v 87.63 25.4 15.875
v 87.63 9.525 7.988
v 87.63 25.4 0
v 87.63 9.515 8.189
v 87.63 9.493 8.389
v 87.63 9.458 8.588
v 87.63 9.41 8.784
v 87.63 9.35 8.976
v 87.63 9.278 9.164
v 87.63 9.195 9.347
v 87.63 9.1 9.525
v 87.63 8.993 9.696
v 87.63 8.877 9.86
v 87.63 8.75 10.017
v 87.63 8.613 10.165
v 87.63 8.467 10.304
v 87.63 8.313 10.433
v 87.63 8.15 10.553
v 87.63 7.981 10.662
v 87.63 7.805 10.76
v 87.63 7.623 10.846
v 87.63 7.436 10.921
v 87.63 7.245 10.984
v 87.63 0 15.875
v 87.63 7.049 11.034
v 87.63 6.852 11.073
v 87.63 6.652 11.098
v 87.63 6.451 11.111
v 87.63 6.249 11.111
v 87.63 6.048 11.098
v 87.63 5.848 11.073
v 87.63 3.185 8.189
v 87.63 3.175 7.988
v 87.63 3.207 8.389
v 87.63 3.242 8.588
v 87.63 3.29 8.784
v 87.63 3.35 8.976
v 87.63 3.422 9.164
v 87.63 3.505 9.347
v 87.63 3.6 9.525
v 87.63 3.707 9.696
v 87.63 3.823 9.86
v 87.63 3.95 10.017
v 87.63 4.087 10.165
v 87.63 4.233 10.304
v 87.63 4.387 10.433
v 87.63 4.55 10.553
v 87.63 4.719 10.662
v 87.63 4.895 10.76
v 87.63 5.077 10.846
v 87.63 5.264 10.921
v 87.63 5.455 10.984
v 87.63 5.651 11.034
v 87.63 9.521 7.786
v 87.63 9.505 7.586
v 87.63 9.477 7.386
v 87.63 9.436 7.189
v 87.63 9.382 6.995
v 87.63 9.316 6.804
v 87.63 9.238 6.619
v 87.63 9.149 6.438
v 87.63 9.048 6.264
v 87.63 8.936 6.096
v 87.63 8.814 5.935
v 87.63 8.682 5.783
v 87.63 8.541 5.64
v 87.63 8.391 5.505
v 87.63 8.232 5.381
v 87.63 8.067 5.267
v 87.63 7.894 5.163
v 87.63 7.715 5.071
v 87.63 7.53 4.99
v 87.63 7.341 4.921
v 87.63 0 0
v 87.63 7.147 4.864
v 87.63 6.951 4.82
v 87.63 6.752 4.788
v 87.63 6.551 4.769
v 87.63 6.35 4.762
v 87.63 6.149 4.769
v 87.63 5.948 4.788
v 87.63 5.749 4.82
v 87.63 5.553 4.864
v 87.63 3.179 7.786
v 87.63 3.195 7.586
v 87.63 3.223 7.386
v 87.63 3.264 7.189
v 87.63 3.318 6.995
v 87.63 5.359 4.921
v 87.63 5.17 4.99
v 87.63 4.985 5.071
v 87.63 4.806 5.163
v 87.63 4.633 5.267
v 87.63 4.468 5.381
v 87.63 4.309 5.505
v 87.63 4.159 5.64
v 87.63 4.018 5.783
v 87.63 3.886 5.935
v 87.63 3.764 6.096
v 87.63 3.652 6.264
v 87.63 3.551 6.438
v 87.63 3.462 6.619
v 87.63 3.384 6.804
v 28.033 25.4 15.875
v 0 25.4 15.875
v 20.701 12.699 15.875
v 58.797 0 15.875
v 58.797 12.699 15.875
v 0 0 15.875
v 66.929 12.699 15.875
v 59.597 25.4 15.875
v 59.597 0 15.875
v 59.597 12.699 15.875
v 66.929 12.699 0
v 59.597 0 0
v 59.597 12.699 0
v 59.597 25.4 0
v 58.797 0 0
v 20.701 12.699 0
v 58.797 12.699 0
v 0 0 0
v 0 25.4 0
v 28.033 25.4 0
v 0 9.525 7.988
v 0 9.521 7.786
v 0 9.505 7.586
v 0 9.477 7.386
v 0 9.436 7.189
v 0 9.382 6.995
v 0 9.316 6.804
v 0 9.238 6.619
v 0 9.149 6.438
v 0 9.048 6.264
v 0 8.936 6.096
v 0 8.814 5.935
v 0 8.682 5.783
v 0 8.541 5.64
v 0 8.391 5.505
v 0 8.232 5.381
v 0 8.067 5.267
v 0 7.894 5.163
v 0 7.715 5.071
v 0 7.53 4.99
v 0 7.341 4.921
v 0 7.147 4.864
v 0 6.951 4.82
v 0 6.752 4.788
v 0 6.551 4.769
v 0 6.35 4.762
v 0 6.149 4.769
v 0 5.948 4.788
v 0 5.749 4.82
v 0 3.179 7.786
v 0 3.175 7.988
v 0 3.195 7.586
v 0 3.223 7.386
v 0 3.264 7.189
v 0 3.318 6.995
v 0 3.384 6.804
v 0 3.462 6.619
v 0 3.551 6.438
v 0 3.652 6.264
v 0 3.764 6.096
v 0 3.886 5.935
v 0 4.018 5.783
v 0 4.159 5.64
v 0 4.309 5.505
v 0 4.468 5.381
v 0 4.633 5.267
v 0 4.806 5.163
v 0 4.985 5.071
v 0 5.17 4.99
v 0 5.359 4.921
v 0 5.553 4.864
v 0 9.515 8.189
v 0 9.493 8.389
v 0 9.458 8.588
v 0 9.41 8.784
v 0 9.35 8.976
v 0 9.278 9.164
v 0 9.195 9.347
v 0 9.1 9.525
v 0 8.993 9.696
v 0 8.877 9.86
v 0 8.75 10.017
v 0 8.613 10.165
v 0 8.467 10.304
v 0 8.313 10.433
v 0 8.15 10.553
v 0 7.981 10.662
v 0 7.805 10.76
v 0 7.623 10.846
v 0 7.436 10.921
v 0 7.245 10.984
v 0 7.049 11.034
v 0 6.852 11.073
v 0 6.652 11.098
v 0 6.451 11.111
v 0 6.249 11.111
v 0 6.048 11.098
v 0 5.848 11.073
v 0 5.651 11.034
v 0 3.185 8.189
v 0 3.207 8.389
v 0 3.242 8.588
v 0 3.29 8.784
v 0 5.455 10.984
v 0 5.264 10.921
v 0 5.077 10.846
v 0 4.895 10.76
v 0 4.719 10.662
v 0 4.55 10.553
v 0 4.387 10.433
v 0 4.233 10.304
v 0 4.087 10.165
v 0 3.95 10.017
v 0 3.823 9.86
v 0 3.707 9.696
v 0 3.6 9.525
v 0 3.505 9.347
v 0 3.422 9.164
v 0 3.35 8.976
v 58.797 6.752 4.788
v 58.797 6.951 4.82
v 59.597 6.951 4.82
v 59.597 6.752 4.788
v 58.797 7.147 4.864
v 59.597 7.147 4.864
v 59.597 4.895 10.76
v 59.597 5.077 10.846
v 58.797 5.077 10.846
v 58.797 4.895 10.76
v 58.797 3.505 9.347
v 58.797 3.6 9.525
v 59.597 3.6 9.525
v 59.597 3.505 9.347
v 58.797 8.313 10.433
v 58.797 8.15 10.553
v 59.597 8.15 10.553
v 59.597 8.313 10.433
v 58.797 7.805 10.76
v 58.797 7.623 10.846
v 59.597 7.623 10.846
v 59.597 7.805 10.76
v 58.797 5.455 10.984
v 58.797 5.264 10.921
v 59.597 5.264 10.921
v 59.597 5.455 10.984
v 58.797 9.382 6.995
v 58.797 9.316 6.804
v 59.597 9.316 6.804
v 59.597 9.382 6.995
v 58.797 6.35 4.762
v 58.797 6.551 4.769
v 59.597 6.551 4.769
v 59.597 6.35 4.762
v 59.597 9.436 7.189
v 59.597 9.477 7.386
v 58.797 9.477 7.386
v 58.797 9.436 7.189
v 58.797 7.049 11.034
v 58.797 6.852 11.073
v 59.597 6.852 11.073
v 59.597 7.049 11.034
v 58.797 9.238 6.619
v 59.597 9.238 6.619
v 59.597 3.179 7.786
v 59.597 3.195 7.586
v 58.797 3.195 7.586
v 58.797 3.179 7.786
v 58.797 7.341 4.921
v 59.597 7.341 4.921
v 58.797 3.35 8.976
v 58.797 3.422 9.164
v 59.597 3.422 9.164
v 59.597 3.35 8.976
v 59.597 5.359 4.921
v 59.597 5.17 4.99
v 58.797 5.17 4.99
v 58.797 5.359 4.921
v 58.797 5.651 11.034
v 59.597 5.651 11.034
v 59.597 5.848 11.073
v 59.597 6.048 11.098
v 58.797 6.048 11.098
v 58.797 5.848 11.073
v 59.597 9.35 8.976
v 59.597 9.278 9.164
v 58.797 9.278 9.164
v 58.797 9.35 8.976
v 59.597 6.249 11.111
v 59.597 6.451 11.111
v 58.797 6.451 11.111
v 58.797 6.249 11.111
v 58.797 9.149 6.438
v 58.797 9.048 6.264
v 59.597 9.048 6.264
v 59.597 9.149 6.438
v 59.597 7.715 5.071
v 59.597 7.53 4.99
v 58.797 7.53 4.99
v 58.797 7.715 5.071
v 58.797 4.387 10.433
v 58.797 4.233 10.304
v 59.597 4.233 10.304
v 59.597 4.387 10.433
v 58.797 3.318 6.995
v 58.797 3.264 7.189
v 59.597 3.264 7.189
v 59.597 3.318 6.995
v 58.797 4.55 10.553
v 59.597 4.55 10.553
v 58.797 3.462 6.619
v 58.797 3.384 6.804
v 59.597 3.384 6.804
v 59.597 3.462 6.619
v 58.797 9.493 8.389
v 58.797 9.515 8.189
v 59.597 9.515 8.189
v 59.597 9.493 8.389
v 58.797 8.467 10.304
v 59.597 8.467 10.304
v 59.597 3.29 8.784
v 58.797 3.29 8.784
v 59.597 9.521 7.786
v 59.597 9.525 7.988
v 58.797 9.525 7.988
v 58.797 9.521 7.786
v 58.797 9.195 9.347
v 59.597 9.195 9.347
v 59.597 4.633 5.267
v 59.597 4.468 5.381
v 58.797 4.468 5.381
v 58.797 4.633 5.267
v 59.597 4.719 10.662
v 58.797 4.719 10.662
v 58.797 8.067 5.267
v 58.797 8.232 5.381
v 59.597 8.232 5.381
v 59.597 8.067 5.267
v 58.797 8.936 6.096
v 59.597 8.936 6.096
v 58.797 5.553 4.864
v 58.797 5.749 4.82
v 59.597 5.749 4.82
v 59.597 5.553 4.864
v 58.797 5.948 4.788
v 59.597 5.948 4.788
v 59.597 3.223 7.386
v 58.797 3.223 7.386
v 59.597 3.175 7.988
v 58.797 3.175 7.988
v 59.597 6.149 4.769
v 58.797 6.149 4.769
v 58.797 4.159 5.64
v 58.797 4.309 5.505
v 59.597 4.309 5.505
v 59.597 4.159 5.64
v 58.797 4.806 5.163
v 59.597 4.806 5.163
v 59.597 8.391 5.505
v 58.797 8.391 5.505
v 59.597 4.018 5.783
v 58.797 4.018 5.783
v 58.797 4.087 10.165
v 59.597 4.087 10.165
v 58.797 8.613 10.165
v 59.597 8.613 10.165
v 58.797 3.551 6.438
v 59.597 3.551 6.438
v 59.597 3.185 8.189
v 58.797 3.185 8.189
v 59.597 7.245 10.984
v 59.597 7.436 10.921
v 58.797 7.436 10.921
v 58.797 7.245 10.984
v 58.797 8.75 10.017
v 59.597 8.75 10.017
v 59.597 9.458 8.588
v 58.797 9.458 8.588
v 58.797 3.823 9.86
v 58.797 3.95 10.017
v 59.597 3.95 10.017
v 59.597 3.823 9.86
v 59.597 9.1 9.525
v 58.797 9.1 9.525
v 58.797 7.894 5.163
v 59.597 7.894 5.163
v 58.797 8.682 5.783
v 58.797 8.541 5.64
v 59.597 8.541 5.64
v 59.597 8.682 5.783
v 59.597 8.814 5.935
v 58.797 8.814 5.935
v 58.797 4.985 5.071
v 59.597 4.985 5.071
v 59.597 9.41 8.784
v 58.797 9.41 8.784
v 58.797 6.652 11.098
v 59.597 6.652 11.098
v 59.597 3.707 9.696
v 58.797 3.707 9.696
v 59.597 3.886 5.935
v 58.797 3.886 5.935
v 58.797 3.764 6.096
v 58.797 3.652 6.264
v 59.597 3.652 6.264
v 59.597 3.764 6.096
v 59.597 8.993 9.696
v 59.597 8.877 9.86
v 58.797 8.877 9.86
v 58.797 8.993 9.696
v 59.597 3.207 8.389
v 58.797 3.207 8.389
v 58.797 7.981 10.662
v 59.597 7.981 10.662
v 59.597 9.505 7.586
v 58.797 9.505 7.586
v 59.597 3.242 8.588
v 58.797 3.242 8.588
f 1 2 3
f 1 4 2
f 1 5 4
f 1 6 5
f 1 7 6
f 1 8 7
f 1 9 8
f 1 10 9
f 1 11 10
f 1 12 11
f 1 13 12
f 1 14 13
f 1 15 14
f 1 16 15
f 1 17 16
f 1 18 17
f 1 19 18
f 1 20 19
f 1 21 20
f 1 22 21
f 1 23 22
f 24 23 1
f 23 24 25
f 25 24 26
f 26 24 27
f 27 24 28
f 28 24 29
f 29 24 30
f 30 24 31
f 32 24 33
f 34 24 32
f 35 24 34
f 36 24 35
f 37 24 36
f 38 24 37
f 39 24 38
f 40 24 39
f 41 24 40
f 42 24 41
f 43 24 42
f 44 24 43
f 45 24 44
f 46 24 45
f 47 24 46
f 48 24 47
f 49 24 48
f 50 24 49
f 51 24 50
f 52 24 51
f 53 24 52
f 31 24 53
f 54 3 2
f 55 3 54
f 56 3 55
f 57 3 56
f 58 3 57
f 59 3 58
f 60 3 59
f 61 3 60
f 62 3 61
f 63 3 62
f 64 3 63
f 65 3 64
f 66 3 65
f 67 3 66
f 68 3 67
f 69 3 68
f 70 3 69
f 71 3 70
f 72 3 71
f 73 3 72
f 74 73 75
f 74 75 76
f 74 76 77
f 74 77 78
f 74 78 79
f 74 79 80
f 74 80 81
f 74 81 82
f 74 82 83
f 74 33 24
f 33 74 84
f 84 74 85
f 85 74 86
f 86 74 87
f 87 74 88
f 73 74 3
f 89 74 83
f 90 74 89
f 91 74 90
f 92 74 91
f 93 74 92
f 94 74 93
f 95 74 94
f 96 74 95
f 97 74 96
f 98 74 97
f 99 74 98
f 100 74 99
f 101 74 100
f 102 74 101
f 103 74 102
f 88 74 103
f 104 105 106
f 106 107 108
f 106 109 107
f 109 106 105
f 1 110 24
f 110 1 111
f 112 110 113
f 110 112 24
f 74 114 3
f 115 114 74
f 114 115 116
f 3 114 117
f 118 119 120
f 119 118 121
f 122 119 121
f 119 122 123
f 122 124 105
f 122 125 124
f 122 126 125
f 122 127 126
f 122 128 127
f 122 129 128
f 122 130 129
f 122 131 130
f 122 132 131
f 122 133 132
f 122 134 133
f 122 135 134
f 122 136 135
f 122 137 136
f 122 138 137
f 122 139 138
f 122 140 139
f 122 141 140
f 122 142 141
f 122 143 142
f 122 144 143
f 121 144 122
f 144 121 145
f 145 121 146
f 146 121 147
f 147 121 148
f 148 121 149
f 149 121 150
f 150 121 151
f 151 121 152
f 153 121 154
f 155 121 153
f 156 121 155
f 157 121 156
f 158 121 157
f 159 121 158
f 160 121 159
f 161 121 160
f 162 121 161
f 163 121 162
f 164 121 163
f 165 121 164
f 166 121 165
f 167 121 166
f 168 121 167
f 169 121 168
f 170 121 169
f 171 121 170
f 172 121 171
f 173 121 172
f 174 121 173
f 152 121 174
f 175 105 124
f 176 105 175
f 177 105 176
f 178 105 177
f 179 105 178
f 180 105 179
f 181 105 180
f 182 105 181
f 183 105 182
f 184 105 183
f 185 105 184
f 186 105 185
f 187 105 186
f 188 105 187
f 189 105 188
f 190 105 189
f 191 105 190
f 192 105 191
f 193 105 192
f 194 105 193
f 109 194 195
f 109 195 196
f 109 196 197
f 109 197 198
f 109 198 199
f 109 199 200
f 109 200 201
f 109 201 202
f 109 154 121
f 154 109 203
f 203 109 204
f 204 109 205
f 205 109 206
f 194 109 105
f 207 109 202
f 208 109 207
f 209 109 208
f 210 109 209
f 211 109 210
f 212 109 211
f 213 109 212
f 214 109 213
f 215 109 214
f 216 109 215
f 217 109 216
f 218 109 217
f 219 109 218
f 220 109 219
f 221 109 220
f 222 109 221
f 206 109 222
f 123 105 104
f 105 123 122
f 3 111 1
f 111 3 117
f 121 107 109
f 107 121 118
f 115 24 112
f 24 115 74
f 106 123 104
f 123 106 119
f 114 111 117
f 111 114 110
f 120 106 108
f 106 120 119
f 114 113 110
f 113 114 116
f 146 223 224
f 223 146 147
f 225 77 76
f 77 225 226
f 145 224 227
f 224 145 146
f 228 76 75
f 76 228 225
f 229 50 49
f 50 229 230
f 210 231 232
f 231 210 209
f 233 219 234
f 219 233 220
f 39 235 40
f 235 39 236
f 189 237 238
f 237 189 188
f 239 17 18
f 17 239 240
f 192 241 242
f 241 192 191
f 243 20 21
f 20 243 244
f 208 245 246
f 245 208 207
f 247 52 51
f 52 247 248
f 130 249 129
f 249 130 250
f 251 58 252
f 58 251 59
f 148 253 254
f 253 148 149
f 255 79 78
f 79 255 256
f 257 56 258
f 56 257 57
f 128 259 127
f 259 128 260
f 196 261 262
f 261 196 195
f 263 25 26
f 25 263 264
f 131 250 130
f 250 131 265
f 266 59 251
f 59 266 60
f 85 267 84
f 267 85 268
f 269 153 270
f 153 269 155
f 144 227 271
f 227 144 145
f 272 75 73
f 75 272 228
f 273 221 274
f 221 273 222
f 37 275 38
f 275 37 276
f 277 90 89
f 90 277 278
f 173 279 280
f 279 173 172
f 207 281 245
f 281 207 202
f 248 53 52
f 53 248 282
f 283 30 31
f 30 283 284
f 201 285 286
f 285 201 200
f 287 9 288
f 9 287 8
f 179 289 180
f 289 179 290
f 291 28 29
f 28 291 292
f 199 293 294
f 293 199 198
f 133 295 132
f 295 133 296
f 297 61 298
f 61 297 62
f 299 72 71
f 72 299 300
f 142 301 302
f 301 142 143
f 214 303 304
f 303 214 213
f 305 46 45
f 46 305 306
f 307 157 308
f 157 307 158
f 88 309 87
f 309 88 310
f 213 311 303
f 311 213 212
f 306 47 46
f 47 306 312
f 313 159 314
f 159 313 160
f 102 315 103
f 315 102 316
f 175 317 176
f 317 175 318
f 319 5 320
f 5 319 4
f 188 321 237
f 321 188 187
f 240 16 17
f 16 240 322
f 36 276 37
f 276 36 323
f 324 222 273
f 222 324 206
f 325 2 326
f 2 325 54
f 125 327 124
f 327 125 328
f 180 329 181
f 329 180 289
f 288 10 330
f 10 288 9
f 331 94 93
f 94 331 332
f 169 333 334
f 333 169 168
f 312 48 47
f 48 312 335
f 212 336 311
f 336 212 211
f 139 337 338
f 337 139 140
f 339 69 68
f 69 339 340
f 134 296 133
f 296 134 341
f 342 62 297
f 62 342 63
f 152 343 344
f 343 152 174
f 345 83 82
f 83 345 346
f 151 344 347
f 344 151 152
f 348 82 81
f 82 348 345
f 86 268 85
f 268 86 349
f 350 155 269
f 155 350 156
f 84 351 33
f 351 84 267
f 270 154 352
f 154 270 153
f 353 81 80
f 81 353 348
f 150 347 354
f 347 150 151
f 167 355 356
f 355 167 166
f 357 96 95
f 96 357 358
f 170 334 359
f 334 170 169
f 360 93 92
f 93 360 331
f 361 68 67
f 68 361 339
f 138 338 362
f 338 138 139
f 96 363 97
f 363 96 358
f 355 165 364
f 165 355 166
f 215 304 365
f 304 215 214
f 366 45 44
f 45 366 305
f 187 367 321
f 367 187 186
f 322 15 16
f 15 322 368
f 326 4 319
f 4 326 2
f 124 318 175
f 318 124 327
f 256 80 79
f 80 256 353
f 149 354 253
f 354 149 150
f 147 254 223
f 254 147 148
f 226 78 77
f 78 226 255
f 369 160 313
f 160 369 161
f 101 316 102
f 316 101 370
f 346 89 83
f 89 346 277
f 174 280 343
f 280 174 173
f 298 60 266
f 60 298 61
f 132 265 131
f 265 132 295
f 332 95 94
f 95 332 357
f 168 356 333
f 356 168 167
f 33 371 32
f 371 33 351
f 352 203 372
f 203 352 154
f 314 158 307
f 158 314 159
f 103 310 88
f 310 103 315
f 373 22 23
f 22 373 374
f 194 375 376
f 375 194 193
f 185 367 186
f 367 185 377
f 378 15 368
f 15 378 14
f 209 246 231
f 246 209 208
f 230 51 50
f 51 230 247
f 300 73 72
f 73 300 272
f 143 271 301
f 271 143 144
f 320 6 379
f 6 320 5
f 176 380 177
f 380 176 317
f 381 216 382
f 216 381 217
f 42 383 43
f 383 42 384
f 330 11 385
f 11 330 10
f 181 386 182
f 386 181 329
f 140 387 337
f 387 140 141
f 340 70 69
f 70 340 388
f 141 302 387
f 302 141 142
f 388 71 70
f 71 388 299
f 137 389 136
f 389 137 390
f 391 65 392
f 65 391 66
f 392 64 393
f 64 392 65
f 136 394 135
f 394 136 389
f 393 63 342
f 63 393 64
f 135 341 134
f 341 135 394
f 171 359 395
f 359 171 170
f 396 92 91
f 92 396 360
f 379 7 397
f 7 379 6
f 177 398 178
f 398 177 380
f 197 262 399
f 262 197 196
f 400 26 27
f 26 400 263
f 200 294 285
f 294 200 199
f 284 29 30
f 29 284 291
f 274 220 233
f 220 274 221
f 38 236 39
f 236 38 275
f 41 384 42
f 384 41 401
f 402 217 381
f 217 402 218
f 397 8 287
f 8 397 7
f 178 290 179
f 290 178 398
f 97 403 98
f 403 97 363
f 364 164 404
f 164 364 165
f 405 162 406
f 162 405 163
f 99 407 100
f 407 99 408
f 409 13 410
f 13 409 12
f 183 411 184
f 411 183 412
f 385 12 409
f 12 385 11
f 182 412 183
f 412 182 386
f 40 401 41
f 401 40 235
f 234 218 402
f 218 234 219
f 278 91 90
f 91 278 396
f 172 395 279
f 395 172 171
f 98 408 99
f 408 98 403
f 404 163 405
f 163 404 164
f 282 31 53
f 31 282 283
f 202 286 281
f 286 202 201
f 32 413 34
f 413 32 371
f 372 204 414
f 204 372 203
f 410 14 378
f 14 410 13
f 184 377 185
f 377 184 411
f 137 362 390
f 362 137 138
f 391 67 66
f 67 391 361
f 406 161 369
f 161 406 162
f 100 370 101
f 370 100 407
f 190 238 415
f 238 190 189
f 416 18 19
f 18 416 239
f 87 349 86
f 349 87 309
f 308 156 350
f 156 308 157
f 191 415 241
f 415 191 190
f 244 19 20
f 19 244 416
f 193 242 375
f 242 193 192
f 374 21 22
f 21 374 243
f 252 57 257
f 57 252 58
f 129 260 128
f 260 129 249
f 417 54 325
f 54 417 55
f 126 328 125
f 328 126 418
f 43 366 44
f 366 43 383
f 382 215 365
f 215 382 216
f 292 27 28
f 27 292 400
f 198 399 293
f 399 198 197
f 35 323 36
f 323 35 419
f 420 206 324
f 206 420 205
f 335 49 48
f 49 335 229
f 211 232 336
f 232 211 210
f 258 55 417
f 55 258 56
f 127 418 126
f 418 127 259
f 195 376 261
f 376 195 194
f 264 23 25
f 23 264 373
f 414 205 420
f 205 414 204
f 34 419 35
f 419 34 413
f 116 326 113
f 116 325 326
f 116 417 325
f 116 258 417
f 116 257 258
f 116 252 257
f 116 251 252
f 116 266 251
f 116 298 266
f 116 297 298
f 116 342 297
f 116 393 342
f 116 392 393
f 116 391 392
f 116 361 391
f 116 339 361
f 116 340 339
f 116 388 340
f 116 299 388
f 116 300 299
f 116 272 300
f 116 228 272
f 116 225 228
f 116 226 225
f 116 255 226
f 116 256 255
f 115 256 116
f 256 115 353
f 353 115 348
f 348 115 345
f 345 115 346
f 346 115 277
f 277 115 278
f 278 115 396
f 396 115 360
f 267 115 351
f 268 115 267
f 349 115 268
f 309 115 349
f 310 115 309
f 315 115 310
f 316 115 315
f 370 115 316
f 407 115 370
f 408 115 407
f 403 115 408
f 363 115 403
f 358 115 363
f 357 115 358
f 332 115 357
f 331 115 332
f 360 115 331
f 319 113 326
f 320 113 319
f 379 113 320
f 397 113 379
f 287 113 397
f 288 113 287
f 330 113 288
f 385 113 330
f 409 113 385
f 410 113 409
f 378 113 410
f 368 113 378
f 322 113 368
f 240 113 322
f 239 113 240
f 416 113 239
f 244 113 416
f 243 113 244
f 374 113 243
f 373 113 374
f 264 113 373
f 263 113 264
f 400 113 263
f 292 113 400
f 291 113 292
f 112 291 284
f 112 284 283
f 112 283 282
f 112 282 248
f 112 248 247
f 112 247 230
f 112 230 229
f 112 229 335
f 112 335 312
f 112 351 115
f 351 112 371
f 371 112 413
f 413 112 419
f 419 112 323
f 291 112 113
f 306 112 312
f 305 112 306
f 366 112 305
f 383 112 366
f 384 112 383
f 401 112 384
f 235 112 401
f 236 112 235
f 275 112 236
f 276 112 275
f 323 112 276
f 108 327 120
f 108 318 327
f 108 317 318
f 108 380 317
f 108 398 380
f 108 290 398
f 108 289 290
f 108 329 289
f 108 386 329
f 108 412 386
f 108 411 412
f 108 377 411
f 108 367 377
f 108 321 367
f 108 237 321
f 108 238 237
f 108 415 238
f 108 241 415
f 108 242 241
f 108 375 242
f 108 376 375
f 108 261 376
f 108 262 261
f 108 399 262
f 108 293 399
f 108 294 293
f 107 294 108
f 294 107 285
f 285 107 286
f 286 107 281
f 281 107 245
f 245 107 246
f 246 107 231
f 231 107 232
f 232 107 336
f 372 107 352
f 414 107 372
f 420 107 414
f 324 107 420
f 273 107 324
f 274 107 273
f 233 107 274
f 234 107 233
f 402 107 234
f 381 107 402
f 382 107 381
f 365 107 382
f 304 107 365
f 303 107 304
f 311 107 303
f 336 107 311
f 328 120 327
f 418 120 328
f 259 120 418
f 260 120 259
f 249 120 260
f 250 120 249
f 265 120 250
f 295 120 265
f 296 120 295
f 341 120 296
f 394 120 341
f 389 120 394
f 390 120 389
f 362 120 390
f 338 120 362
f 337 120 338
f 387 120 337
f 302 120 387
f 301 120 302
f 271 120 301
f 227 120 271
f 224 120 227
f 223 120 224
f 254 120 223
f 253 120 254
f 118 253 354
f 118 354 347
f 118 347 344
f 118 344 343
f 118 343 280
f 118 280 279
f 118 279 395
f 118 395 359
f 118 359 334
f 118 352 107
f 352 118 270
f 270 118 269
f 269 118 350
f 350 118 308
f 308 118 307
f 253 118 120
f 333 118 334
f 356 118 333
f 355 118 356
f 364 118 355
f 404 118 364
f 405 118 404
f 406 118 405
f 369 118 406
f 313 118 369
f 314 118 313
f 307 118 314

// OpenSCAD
/* dimensions of metal stock */
// length of stock in mm
$stock_x = 87.63; // [10.0:200.0]
// height of stock in mm
$stock_y = 25.4;  // [10.0:150.0]
// width of stock in mm
$stock_z = 15.875;  // [4.0:50.0]
/* dovetail dimensions */
// dovetail angle (usually 60)
$dove_angle = 60; //[30:70]
// widest part of the dovetail, in mm
$dove_max_width = 46.228;  // [5.0:150.0]
// depth of dovetail, in mm
$dove_depth = 12.7; // [5.0:100.0]
// width of the movable/clamp end in mm (minus dovetail overhang)
$clamp_width = 20.701;  // [5:100.0]
// gap made by virtual slitting saw
$slice_width = 0.80; // [0.04:4.0]
// diameter of hole for threaded clamping rod
$clamp_rod_dia = 6.35; // [1.0:15.0]
/* 
   NOTE: 6.35 for 1/4, 4.978 for #10, 4.305 for #8, 3.657 for #6
*/

dove_overhang = ($dove_depth / tan($dove_angle));
dove_x_offset = $clamp_width + ($dove_max_width / 2);
slice_location = dove_x_offset + ($dove_max_width / 2) - 
                 dove_overhang - $slice_width;

difference() {
    // the hunk of metal:
    cube([$stock_x, $stock_y, $stock_z]);
    translate([0, $stock_y - $dove_depth, 0]) {
        min_width = $dove_max_width - (2*dove_overhang);       
        // make a 3D dovetail from a 2D outline
        linear_extrude(height=$stock_z, convexity=2) {
            translate([dove_x_offset, $dove_depth, 0]) {
                rotate([0,0,180]) {
                    // the actual dovetail shape:
                    polygon(paths=[[0,1,2,3,0]], 
                            points=[[-min_width/2,0], 
                                    [-$dove_max_width/2, $dove_depth + 0.001], 
                                    [$dove_max_width/2, $dove_depth + 0.001], 
                                    [min_width/2,0]]);
                };
            };
        };
    };
    
    // the bore for the clamping threaded rod:
    translate([0, (($stock_y - $dove_depth) / 2), ($stock_z / 2)]) {
        rotate([0, 90, 0]) {
            cylinder(h=$stock_x, r=($clamp_rod_dia / 2), $fn=99);
        };
    };
    
    // slit with a slitting saw:
    translate([ slice_location, 0, 0 ]) {
            cube([$slice_width, ($stock_y - $dove_depth), $stock_z+5]);
    };
};
